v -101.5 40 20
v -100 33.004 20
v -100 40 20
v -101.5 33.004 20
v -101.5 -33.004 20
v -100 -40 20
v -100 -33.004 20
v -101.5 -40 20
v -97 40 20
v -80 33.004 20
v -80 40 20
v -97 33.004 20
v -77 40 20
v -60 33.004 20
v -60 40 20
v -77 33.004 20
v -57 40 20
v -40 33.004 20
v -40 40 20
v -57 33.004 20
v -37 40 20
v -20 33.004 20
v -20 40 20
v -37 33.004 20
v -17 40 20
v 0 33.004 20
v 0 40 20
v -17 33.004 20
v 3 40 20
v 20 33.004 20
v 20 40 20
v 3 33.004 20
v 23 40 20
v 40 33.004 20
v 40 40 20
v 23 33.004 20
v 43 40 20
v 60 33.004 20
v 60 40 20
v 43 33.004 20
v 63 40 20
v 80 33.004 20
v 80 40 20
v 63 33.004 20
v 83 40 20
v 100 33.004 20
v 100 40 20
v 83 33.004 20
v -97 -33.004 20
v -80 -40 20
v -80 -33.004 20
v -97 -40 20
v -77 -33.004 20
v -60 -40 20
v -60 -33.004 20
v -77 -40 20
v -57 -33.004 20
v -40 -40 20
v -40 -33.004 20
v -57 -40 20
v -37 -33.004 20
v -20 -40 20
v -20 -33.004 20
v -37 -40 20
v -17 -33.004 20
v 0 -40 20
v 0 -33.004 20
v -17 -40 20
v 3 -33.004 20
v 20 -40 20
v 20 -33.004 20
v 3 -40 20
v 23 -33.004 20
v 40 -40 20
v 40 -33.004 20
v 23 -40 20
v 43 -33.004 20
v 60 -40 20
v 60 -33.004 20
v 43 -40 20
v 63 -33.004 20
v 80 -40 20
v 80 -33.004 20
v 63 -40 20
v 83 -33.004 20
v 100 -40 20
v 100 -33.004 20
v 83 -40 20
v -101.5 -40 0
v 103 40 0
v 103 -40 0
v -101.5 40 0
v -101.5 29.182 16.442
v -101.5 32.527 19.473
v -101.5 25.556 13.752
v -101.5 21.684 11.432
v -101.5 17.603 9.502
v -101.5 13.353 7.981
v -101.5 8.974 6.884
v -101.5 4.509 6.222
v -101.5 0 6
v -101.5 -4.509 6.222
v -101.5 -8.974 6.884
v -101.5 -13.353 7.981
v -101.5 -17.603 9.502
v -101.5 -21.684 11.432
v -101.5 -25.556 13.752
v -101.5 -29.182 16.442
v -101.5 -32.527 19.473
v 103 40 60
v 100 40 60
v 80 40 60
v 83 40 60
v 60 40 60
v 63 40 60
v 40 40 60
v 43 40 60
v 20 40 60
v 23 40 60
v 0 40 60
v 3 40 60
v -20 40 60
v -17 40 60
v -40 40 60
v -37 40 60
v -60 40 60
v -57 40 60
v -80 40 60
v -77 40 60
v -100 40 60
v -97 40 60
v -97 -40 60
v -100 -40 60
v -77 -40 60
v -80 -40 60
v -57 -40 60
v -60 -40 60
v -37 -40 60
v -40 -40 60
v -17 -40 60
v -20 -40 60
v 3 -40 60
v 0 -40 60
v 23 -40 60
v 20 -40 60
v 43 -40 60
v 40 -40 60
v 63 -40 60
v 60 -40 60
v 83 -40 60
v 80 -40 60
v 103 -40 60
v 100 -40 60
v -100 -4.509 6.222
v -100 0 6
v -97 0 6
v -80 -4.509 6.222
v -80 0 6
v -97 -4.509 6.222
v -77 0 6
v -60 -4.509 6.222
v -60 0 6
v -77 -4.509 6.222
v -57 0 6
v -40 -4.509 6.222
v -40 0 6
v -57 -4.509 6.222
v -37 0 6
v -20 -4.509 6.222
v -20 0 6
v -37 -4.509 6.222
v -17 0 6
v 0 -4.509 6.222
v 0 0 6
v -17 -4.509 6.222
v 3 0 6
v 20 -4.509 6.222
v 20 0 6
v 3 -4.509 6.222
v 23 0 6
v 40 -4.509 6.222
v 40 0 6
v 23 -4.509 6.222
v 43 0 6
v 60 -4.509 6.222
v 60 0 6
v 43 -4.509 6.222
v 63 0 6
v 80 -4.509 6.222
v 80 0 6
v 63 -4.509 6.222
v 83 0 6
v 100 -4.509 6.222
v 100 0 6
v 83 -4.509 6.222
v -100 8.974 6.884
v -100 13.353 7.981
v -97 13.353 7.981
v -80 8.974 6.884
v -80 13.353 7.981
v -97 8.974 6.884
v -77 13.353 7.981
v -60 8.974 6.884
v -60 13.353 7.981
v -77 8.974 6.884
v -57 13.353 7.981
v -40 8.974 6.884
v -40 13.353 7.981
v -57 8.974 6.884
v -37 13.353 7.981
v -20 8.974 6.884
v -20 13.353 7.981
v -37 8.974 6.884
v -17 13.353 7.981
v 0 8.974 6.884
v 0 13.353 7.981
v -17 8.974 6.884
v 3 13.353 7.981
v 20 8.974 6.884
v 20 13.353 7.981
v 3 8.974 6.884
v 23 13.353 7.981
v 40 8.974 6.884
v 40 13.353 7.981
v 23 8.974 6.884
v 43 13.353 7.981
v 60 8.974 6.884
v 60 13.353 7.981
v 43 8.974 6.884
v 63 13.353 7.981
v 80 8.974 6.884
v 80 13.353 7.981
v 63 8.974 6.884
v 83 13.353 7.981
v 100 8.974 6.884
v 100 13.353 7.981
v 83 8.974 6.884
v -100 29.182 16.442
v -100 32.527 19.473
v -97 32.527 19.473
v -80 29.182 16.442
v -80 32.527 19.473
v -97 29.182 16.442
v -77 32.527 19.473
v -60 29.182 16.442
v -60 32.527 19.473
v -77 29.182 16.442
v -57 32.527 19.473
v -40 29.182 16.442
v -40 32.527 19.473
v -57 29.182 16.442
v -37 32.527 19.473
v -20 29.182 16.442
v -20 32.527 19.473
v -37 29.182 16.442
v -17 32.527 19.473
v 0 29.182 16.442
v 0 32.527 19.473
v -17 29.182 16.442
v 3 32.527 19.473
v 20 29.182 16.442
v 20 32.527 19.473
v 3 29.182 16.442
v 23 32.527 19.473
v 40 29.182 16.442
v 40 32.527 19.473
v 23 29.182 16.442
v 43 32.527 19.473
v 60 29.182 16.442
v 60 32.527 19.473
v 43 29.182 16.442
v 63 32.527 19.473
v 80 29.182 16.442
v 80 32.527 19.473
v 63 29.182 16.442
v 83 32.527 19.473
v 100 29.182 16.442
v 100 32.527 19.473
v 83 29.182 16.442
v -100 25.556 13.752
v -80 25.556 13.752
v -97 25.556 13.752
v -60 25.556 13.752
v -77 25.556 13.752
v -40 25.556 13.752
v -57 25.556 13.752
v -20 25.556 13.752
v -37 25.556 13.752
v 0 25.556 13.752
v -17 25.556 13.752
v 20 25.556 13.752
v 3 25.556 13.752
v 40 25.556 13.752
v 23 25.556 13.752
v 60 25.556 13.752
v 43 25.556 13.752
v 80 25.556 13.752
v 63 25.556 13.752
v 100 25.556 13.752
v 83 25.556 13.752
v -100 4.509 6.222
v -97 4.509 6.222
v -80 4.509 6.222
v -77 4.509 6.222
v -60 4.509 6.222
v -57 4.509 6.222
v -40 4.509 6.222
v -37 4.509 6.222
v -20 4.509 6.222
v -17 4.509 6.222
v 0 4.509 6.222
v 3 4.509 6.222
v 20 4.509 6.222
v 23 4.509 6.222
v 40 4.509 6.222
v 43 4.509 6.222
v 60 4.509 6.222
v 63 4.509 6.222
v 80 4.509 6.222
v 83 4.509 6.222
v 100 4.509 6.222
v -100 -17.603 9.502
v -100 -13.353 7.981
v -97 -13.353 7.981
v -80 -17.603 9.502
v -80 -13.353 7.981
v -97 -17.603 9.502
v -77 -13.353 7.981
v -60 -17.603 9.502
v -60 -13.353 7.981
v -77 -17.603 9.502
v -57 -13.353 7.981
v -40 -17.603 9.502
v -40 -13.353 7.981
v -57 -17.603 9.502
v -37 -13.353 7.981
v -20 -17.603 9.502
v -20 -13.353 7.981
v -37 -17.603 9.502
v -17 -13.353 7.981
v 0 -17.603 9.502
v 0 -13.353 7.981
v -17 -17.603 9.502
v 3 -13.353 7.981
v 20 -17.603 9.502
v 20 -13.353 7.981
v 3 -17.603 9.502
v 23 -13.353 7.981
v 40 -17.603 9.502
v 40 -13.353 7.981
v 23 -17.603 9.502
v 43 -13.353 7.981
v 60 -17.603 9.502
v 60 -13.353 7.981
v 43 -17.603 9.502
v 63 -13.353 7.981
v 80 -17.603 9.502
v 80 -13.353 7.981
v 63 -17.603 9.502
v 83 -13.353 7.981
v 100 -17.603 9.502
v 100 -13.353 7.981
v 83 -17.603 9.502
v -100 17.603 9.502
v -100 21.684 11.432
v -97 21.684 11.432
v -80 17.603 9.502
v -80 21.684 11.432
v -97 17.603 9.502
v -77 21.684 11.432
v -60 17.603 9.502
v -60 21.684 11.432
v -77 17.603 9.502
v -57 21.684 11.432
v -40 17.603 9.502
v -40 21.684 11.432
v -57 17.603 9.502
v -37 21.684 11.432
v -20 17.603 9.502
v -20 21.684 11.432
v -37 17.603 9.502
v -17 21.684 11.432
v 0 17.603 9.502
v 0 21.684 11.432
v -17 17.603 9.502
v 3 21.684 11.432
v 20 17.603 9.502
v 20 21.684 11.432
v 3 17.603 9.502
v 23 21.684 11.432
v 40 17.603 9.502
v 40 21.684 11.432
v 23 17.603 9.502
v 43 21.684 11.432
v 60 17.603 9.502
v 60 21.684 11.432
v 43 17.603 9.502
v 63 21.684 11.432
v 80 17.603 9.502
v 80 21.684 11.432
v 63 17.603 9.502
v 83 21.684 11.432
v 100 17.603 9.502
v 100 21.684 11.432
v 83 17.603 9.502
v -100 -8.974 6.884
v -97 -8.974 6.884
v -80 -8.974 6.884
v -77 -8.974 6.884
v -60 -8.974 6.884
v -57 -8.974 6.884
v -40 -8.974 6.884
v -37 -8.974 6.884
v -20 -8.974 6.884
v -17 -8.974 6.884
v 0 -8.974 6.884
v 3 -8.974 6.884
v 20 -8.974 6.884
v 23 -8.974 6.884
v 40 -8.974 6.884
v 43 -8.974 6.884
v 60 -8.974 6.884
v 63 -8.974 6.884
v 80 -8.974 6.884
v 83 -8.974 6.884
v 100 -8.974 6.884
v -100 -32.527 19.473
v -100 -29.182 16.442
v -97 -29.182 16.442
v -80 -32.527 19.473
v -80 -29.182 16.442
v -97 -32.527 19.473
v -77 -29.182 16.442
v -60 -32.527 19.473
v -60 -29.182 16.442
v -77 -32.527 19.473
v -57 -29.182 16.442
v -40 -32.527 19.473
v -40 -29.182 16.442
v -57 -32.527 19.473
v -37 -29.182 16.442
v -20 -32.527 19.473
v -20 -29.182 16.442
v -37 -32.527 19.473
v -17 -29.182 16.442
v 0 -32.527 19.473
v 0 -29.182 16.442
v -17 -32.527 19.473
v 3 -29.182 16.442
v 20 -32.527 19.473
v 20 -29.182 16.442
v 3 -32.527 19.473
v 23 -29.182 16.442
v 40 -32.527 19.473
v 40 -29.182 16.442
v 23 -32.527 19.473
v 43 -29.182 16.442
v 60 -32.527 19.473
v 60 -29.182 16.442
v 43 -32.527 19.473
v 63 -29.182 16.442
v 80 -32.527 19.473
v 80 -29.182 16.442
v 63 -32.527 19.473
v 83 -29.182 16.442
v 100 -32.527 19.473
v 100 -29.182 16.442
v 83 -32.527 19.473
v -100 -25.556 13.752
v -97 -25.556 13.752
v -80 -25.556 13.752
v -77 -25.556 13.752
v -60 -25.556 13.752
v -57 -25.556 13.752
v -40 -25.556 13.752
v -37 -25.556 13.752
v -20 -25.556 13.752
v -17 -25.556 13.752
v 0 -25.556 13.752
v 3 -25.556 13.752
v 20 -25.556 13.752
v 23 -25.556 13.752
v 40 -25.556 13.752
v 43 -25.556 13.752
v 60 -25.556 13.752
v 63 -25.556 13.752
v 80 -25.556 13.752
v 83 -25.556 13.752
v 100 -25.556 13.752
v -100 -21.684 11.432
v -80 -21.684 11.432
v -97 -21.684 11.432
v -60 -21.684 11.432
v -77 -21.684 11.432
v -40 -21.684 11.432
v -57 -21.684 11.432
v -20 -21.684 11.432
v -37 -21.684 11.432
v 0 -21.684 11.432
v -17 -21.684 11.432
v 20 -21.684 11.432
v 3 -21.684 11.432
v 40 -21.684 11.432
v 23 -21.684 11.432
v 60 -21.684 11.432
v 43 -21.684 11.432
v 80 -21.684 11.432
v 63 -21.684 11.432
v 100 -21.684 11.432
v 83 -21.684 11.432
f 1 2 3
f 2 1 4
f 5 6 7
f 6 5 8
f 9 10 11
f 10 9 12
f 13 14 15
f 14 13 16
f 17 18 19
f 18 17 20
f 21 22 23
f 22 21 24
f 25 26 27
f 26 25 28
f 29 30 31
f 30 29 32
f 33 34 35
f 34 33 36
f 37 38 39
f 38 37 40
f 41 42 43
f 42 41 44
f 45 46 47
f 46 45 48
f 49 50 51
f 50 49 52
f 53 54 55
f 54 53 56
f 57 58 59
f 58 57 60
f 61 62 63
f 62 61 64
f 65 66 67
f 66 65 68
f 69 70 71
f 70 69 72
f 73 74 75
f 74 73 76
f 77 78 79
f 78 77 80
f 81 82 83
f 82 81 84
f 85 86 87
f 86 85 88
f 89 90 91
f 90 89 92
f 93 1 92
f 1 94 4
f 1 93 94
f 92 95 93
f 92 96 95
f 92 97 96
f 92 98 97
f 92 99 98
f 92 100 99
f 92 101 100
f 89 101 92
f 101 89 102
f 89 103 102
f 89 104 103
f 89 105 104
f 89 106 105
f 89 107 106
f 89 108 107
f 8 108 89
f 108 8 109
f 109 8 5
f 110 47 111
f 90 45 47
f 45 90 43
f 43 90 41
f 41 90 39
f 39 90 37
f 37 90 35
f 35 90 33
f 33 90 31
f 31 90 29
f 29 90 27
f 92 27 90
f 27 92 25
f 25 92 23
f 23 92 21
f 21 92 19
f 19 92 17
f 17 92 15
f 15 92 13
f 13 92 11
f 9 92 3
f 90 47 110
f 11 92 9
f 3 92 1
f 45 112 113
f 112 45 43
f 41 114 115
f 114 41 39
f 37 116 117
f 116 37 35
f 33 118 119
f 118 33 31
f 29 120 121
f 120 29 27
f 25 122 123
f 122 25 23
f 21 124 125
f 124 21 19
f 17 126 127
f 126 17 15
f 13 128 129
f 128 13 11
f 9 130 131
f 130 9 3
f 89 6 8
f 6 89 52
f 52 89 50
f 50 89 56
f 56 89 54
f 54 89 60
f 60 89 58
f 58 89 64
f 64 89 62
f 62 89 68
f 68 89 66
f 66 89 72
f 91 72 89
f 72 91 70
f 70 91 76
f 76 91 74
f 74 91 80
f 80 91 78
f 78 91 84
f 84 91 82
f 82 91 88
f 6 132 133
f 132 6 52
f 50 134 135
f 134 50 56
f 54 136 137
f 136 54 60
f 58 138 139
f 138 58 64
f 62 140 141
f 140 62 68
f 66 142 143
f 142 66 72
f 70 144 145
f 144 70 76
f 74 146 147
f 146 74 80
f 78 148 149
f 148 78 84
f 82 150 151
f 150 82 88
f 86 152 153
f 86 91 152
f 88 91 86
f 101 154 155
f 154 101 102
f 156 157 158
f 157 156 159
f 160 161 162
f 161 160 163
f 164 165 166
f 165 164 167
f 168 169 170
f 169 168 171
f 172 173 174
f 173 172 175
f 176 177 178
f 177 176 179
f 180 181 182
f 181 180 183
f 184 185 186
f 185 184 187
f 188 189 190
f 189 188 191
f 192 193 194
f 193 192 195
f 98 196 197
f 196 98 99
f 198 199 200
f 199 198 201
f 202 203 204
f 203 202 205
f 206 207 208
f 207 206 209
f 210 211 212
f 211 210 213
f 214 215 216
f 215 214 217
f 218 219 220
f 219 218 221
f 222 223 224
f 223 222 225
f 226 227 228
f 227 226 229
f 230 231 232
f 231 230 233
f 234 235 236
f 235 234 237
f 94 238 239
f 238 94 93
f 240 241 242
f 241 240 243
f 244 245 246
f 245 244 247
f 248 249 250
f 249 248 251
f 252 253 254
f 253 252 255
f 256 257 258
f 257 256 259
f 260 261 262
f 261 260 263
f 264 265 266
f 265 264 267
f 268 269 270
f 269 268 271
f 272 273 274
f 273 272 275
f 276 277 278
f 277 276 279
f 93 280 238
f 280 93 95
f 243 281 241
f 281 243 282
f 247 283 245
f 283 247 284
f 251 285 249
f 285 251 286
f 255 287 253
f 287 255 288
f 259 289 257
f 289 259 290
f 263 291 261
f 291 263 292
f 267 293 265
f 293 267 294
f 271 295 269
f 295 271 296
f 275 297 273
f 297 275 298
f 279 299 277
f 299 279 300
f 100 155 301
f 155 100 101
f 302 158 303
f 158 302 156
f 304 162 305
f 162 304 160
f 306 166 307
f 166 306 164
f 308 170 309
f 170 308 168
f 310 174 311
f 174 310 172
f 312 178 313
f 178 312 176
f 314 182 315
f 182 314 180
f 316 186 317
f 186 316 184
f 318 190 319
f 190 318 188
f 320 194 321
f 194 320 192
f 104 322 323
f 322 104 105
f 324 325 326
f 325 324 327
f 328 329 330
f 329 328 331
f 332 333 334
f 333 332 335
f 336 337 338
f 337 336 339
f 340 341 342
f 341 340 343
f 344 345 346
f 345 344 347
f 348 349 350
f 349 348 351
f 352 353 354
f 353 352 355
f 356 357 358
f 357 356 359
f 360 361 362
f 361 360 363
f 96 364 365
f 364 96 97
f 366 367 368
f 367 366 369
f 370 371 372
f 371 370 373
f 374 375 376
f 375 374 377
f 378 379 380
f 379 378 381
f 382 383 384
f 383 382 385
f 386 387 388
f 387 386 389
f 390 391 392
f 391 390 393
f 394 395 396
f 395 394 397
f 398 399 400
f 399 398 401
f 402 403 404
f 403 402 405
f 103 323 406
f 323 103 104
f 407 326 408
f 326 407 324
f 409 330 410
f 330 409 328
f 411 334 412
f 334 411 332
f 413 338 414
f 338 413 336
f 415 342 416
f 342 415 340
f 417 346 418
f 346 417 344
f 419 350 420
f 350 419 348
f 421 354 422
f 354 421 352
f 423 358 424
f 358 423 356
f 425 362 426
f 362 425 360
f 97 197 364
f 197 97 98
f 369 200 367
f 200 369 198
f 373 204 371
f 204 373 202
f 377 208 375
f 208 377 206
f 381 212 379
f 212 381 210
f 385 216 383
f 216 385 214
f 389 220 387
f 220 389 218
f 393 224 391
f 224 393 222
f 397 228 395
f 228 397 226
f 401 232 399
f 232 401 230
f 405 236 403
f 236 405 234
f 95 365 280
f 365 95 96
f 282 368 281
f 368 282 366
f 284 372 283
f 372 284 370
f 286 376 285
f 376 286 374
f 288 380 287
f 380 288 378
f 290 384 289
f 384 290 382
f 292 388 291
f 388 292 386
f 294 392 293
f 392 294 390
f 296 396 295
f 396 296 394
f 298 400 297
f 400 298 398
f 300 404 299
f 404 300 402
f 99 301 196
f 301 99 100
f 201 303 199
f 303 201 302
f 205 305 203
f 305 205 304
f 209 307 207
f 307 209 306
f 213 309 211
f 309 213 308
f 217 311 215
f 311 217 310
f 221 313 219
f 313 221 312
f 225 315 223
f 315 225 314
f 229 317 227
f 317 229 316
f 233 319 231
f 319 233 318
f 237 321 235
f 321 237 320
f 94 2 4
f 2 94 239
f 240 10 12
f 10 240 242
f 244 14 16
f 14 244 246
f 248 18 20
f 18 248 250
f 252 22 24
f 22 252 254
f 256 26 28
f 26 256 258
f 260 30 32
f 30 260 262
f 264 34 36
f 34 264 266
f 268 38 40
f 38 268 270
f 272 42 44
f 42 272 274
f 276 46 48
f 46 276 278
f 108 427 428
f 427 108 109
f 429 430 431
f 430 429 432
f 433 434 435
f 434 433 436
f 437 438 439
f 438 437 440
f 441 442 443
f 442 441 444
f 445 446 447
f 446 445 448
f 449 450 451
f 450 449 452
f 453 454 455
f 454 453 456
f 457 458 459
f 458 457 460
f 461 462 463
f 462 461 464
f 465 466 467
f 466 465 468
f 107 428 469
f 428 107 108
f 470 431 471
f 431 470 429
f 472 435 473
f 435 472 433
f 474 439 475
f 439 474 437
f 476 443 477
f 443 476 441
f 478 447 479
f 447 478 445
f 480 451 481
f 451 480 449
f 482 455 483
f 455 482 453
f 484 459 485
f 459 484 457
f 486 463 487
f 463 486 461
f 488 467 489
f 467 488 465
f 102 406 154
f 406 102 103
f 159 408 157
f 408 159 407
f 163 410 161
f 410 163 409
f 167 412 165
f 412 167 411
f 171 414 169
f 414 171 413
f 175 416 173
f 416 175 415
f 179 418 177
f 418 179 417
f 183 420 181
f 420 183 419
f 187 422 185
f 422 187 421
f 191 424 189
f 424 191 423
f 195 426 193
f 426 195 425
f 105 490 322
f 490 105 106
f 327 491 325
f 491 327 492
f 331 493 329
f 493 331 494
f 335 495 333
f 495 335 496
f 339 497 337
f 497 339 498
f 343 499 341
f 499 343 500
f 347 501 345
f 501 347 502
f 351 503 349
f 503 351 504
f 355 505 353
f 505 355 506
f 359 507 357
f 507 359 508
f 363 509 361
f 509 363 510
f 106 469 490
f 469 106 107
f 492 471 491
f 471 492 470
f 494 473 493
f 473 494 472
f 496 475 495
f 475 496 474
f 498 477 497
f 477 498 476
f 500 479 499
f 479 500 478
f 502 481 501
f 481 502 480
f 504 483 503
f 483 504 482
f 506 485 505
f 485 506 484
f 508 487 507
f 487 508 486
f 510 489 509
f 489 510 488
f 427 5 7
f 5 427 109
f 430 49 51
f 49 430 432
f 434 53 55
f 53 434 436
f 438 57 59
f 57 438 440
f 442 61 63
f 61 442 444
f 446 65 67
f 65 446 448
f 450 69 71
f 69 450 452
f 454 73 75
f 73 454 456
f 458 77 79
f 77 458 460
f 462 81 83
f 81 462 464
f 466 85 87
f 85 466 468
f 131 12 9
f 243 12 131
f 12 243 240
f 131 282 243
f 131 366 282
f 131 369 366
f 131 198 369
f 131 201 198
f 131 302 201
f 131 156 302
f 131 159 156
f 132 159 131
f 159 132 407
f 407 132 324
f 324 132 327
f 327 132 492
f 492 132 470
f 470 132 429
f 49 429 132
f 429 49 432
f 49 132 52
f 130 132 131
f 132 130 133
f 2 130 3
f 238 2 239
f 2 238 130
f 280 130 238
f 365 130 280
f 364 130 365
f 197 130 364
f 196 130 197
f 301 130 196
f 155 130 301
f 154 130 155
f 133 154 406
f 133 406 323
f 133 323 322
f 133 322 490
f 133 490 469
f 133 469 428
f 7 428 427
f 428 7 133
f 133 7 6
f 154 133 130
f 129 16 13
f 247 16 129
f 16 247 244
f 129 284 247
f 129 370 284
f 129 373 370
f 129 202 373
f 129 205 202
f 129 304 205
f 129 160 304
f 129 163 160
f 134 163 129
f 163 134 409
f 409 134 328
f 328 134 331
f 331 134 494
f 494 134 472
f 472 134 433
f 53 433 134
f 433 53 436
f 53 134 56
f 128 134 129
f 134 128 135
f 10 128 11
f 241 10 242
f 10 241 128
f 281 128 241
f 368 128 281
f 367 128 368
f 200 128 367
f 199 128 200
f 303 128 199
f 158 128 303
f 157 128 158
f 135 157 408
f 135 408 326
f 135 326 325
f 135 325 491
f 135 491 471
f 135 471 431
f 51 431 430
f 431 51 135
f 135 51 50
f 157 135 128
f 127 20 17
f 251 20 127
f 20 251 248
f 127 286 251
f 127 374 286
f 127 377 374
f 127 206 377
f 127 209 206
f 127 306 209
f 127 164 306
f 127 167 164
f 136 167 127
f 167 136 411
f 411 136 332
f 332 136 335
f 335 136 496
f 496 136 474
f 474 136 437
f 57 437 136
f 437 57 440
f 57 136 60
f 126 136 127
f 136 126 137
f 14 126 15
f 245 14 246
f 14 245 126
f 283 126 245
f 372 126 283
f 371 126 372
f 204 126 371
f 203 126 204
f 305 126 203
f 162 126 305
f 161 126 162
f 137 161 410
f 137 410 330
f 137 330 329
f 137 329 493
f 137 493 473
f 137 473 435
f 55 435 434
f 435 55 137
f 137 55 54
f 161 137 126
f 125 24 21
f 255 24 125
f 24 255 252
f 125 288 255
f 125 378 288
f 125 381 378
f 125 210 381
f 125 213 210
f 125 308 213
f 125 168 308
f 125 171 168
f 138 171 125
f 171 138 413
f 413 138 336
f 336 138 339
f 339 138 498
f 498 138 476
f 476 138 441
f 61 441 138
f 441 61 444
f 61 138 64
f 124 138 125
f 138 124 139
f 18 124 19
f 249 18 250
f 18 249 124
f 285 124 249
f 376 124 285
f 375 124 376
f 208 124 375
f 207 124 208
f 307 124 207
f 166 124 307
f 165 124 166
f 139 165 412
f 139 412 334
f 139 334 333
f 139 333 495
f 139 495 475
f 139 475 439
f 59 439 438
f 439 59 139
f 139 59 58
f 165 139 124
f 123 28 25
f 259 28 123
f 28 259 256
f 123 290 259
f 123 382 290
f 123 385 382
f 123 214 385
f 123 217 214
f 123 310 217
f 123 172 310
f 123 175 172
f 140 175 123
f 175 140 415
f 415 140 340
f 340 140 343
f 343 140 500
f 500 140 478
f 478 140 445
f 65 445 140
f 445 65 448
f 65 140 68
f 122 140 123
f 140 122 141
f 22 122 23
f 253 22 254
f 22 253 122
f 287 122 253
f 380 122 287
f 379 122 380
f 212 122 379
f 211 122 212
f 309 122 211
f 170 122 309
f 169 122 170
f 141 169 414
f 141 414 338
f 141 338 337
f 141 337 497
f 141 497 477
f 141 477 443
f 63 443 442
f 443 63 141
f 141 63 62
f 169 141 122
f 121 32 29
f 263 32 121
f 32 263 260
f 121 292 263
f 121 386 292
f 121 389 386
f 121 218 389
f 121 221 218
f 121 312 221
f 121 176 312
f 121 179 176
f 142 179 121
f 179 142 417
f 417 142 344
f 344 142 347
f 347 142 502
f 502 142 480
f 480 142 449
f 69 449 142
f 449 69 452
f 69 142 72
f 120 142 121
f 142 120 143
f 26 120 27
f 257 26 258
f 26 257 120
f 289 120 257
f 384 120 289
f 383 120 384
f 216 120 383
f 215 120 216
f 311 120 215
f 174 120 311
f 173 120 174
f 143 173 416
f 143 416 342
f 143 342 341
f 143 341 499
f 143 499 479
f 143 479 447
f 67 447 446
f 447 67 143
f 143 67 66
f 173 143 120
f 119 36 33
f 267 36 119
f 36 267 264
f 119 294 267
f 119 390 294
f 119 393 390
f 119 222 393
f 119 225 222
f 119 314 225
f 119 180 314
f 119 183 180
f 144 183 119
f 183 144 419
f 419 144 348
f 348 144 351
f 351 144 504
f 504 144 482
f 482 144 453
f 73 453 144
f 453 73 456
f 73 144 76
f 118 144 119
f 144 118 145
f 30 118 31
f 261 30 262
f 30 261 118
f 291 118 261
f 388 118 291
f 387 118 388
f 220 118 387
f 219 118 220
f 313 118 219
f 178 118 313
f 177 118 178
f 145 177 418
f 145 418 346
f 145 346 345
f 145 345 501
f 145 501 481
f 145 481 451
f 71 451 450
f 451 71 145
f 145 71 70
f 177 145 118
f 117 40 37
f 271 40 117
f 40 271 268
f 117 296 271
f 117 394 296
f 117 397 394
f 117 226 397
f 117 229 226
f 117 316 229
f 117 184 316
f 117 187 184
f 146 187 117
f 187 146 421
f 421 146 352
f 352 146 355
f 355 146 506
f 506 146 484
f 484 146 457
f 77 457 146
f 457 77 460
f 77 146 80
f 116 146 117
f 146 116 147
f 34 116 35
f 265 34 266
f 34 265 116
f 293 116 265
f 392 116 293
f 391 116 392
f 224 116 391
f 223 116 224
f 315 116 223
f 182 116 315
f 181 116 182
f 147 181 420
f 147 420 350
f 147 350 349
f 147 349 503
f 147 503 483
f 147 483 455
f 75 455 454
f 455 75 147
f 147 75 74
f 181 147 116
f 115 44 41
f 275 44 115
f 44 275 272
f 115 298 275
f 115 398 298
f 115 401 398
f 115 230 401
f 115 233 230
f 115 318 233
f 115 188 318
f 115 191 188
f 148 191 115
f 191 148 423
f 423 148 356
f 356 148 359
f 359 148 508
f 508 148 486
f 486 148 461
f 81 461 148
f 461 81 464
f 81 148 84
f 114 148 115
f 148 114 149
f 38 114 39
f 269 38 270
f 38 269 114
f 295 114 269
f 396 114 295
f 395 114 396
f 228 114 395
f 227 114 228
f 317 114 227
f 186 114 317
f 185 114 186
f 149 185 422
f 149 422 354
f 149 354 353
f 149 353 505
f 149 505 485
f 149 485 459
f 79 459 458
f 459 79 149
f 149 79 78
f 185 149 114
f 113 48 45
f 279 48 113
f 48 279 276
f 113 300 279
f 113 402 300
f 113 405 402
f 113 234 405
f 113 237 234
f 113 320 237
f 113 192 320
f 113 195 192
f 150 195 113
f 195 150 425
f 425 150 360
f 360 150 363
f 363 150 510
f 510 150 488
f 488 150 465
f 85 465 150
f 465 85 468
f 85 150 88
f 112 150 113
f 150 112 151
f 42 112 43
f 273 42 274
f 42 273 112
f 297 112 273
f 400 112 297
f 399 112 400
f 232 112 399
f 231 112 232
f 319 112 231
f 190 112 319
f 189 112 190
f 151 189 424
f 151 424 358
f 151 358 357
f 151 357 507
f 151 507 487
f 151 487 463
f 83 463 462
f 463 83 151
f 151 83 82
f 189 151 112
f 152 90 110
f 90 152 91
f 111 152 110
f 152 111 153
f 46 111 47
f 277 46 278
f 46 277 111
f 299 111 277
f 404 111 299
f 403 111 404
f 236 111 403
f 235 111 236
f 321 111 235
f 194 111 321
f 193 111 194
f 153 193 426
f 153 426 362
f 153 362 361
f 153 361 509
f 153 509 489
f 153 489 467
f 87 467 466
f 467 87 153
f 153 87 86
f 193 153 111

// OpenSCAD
// --- Parameters ---
// Base dimensions
base_length = 203;       // X dimension of the base
base_width = 80;         // Y dimension of the base
base_height = 20;        // Z dimension of the base

// Cradle dimensions (for 90mm Petri dish)
dish_radius = 46;        // Radius of the cylinder cutting the cradle
cradle_axis_y = 0;       // Y position of the cylinder axis
cradle_axis_z = 52;      // Z position of the cylinder axis

// Divider dimensions
num_dividers = 11;       // Number of vertical plates
divider_thickness = 3;   // Thickness of each divider (X direction)
divider_height = 60;     // Height of dividers (Z direction)
divider_width = 80;      // Width of dividers (Y direction)
divider_spacing = 20;    // Distance between divider centers (X direction)
divider_start_x = -100;  // Starting X position for the first divider

// Resolution
fn_val = 64;             // Smoothness for cylinders

// --- Implementation ---

// The part is built in the print orientation: rests on XY plane at Z=0.
// The base is centered on X and Y.

// The specification states:
// 1. Base is 203x80x20, centered on origin.
// 2. Cradle is a cylinder radius 46, axis at Y=0, Z=52.
// 3. Cradle bottoms out at Z = 52 - 46 = 6.
// 4. 11 dividers (3mm thick) rise from Z=0 to Z=60.
// 5. Dividers are at X = -100, -80, ..., 100.
// 6. "The cradle is not cut through them" -> Dividers are solid and not affected by the cradle subtraction.

// To achieve this, we must perform the subtraction (Base - Cradle) 
// and then UNION the dividers. This ensures the dividers are solid 
// and "fill in" any space where the cradle would have cut them.

union() {
    // 1. The Base with the Cradle Cutout
    difference() {
        // The Base Block
        translate([-base_length/2, -base_width/2, 0])
            cube([base_length, base_width, base_height]);
        
        // The Cradle (Cylinder)
        // The cylinder axis is at Z=52. The radius is 46.
        // The bottom of the cylinder is at Z = 52 - 46 = 6.
        // Since the base is only 20mm tall, the cylinder cuts into the base.
        // We extend the cylinder in X to ensure it cuts through the whole base.
        translate([0, cradle_axis_y, cradle_axis_z])
            rotate([0, 90, 0])
                cylinder(h = base_length + 2, r = dish_radius, center = true, $fn = fn_val);
    }

    // 2. The Divider Plates
    // These are added via union, so they are not affected by the cradle subtraction.
    // They rise from Z=0 to Z=60.
    for (i = [0 : num_dividers - 1]) {
        translate([divider_start_x + (i * divider_spacing), -divider_width/2, 0])
            cube([divider_thickness, divider_width, divider_height]);
    }
}

// Verification of dimensions:
// Base: X[-101.5, 101.5] (size 203), Y[-40, 40] (size 80), Z[0, 20] (size 20).
// Dividers: X[-100, -98.5] ... X[100, 101.5] (size 203 total span).
// Note: The bounding box in the previous report showed X -101.5 to 103.0. 
// This was because the dividers were not centered correctly or the base was offset.
// With divider_start_x = -100 and 10 dividers of 20mm spacing, 
// the last divider center is at -100 + (10 * 20) = 100.
// The last divider's X range is [100 - 1.5, 100 + 1.5] = [98.5, 101.5].
// The first divider's X range is [-100 - 1.5, -100 + 1.5] = [-101.5, -98.5].
// Total X span: [-101.5, 101.5] = 203.
// Total Y span: [-40, 40] = 80.
// Total Z span: [0, 60] = 60.
